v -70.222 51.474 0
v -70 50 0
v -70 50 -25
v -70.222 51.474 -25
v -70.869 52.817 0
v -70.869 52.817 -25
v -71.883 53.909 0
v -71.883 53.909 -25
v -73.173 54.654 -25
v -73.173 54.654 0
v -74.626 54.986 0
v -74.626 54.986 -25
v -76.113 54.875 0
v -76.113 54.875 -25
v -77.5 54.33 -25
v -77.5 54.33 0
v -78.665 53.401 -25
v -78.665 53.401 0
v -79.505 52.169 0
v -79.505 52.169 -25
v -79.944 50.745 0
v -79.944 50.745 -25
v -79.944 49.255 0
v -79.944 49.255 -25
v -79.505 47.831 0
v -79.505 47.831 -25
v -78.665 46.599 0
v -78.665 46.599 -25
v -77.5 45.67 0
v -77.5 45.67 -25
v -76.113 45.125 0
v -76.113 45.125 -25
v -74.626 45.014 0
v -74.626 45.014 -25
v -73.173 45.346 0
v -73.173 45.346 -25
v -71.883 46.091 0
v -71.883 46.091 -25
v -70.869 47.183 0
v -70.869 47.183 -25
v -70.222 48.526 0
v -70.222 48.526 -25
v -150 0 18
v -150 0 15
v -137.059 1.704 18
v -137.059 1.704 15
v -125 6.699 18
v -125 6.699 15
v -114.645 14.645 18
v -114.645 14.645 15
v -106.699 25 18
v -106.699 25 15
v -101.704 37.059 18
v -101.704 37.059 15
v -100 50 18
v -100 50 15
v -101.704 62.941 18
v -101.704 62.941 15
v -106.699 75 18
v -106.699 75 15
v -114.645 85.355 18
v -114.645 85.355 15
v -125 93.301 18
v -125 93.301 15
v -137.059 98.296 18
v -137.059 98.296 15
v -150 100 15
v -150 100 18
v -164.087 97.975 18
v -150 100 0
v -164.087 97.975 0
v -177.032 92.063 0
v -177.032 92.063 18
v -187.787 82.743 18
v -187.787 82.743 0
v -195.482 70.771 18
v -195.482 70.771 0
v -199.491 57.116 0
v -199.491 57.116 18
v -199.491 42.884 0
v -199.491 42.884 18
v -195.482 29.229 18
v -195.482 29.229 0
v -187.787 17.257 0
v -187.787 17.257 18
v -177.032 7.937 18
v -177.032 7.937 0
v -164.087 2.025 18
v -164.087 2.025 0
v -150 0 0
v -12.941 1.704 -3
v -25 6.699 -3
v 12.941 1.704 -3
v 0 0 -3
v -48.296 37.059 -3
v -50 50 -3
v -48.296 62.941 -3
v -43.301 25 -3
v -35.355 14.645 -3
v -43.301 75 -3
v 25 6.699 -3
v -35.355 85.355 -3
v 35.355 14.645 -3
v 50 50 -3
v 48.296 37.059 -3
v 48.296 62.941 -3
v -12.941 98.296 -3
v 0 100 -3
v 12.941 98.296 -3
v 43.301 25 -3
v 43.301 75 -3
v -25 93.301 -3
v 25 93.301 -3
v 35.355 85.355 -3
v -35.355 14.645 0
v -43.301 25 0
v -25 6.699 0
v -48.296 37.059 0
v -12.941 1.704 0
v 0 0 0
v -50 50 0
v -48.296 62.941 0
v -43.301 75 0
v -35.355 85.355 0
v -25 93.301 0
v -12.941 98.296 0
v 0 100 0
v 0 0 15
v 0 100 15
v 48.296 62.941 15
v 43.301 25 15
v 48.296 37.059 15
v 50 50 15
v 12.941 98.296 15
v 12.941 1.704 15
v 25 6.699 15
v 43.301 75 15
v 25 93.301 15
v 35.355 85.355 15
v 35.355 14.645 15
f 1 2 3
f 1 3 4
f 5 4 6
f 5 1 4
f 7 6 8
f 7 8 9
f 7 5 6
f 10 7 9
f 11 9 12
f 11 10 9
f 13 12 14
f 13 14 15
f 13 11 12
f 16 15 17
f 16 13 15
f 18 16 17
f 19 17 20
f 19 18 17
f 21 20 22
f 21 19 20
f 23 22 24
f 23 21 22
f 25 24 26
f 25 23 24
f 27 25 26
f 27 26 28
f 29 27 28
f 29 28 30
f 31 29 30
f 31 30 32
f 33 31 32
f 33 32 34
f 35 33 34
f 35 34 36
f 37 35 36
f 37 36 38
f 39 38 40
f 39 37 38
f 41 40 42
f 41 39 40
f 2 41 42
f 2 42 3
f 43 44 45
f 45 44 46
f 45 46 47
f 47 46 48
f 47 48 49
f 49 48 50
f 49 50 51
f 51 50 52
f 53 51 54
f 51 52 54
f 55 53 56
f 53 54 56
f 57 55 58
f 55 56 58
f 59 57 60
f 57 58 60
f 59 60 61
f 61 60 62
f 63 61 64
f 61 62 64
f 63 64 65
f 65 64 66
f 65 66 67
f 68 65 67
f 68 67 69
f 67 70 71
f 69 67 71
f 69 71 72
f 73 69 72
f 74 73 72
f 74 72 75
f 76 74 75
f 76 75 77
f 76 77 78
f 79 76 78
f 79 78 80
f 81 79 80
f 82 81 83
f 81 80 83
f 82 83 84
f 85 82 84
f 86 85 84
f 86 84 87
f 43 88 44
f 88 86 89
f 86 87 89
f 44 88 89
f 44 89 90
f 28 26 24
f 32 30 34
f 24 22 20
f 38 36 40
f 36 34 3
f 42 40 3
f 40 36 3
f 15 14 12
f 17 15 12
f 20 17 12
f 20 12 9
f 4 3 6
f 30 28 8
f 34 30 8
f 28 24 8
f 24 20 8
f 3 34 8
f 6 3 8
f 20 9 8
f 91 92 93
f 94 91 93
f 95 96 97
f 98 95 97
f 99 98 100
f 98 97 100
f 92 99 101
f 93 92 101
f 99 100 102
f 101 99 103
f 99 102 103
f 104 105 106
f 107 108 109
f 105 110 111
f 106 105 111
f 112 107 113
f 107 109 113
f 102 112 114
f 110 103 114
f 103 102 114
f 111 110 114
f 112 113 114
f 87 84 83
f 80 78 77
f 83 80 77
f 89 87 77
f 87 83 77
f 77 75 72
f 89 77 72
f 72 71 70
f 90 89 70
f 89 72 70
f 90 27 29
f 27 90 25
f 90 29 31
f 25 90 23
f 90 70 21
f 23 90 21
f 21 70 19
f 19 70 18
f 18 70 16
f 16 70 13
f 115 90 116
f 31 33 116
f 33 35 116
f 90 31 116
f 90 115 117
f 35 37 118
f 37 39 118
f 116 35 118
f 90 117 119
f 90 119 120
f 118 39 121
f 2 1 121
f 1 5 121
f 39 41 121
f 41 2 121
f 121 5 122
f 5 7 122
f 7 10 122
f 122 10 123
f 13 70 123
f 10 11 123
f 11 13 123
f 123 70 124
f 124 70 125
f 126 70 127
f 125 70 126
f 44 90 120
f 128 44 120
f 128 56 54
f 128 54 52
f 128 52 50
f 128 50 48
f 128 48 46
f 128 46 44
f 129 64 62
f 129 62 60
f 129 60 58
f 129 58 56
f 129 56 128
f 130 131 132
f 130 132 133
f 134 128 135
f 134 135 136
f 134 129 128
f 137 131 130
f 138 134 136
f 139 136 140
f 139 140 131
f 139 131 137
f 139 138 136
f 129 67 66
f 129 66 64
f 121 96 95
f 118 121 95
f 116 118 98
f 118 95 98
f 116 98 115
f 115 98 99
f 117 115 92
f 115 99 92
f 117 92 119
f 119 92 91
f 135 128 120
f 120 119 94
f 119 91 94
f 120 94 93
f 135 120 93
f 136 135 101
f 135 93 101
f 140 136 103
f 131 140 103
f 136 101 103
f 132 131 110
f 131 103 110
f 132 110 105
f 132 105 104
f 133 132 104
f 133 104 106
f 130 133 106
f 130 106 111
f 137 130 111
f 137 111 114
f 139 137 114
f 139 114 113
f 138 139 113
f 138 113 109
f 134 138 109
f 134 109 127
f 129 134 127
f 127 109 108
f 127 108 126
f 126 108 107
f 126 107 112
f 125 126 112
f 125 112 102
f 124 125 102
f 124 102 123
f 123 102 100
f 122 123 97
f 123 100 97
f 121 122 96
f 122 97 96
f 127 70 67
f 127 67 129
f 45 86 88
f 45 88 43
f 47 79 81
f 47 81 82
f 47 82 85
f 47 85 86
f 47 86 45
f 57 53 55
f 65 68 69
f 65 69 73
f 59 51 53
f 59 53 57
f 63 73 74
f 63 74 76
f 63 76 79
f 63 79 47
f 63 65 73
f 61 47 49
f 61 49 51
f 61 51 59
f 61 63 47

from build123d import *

# Parameters (mm, degrees)
SKETCH_1_W      = 150
SKETCH_1_H      = 100
EXTRUDE_1_DEPTH = 15
EXTRUDE_4_DEPTH = 15
SKETCH_1_14_R   = 50
EXTRUDE_6_DEPTH = 18
EXTRUDE_START   = -3
SKETCH_1_16_R   = 50
EXTRUDE_7_DEPTH = 3
SKETCH_1_17_R   = 5
EXTRUDE_8_DEPTH = 25


with BuildPart() as part:
    # 草图1 → 凸台-拉伸1 (new body)
    with BuildSketch(Plane.XY):
        with Locations((-75, 50)):
            Rectangle(SKETCH_1_W, SKETCH_1_H)
    extrude(amount=EXTRUDE_1_DEPTH)

    # 草图1<10> → 凸台-拉伸4 (add)
    with BuildSketch(Plane.XY):
        with BuildLine():
            ThreePointArc((-150, 100), (-200, 50), (-150, 0))
            Line((-150, 0), (-150, 100))
        make_face()
        with BuildLine():
            Line((0, 100), (0, 0))
            ThreePointArc((0, 0), (50, 50), (0, 100))
        make_face()
    extrude(amount=EXTRUDE_4_DEPTH)

    # 草图1<14> → 凸台-拉伸6 (add)
    with BuildSketch(Plane.XY):
        with Locations((-150, 50)):
            Circle(SKETCH_1_14_R)
    extrude(amount=EXTRUDE_6_DEPTH)

    # 草图1<16> → 凸台-拉伸7 (add)
    with BuildSketch(Plane.XY.offset(EXTRUDE_START)):
        with Locations((0, 50)):
            Circle(SKETCH_1_16_R)
    extrude(amount=EXTRUDE_7_DEPTH)

    # 草图1<17> → 凸台-拉伸8 (add)
    with BuildSketch(Plane.XY):
        with Locations((-75, 50)):
            Circle(SKETCH_1_17_R)
    extrude(amount=-EXTRUDE_8_DEPTH)


solid = part.part
